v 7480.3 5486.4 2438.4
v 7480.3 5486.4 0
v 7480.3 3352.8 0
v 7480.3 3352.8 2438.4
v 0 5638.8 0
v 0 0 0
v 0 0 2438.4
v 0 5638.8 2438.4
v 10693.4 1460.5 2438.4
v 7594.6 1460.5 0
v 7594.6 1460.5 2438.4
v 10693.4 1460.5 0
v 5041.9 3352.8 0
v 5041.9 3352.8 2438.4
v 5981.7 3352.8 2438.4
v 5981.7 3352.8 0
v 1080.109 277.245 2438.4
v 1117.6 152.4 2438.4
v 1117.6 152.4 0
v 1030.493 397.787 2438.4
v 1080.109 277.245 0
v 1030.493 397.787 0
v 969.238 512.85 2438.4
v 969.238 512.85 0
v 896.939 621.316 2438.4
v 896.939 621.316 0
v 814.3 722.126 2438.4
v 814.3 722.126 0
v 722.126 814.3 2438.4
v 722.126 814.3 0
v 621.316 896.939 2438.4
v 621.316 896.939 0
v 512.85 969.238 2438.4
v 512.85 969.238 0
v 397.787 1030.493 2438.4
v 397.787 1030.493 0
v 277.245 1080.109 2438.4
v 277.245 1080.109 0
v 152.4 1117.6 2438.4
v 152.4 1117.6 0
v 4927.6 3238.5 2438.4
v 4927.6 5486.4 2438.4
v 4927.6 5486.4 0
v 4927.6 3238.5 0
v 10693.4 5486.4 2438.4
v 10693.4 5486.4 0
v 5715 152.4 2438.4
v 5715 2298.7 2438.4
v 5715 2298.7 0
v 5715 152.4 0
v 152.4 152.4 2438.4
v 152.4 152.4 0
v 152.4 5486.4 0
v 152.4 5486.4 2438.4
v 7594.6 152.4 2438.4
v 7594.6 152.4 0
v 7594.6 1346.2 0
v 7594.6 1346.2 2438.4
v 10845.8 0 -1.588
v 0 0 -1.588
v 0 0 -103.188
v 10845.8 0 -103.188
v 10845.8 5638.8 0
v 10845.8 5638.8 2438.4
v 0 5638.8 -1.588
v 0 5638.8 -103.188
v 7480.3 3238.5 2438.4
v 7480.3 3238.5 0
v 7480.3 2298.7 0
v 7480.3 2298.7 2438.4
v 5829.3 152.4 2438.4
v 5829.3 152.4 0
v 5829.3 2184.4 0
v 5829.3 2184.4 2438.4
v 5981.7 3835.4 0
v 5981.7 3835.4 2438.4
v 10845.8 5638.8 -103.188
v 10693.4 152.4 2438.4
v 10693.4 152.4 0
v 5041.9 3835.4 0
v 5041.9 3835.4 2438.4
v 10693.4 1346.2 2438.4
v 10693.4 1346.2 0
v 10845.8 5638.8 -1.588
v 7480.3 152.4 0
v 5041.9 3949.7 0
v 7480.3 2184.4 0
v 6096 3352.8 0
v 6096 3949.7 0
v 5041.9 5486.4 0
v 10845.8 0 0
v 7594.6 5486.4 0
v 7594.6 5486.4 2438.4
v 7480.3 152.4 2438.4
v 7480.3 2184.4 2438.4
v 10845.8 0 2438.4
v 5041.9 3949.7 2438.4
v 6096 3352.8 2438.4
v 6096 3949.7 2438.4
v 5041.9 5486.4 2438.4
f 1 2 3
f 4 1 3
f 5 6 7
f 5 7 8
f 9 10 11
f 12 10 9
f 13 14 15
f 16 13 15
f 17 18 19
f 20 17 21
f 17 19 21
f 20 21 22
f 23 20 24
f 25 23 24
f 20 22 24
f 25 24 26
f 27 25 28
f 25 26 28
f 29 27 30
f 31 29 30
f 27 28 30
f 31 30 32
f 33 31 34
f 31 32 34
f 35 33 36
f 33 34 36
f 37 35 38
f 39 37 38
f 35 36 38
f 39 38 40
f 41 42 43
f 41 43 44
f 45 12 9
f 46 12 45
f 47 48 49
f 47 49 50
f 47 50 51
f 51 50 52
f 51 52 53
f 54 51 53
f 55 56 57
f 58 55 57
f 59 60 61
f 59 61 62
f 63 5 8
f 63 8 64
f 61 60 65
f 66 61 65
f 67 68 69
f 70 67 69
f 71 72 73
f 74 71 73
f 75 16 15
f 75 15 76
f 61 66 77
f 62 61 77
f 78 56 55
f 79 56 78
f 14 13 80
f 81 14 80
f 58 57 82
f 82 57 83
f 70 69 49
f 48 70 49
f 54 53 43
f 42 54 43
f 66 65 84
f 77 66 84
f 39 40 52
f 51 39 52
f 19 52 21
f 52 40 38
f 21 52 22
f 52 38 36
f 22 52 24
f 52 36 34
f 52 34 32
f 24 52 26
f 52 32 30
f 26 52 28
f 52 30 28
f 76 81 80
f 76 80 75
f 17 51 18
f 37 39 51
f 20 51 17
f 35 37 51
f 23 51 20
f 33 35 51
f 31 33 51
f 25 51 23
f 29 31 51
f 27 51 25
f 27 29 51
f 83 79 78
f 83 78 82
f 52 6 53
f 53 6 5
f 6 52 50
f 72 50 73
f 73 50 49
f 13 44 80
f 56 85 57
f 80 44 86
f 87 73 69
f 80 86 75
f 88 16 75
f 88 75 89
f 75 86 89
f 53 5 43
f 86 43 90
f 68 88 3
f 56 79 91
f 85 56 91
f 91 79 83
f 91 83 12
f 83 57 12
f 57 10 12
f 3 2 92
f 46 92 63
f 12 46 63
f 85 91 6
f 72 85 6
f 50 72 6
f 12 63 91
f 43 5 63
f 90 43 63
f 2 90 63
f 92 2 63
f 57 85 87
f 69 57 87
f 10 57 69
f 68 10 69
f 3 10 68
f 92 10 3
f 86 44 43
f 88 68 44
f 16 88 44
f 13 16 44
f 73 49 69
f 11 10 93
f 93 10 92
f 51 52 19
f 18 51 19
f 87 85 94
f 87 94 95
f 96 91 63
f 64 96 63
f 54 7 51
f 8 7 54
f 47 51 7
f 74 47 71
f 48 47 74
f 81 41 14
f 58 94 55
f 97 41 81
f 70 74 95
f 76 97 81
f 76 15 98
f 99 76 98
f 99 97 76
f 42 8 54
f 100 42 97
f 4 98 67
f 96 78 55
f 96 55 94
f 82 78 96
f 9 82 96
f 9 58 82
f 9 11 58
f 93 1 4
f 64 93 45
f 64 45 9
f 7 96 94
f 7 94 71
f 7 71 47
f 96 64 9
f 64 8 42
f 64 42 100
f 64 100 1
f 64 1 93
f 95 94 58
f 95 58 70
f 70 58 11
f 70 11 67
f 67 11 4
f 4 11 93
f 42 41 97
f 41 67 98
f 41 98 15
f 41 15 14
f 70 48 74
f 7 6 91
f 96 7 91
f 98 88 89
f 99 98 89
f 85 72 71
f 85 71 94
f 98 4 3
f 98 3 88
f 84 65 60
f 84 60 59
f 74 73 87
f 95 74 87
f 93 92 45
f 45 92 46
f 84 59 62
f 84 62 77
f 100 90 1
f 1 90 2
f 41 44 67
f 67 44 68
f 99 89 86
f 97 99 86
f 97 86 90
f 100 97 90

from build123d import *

# Parameters (mm, degrees)
F1_W     = 10845.8
F1_H     = 5638.8
F1_W_2   = 1651
F1_H_2   = 2032
F1_W_3   = 3098.8
F1_H_3   = 1193.8
F1_W_4   = 939.8
F1_H_4   = 482.6
F1_H_5   = 4025.9
F3_DEPTH = 2438.4
F4_W     = 10845.8
F4_H     = 5638.8
F5_DEPTH = 101.6


# Not quite as in the source:
# - a length typed as a fraction of an inch, garbled in the dataset ("3 / 203.2 mm" for 3/8 in), is restored


with BuildPart() as f3:
    # F1 (on Top) → F3 (new body)
    with BuildSketch(Plane.XY):
        with Locations((5422.9, 2819.4)):
            Rectangle(F1_W, F1_H)
        Polygon((4927.6, 5486.4), (4927.6, 3238.5), (5041.9, 3238.5), (7480.3, 3238.5), (7480.3, 2298.7), (5829.3, 2298.7), (5715, 2298.7), (5715, 152.4), (152.4, 152.4), (152.4, 5486.4), align=None, mode=Mode.SUBTRACT)
        with Locations((6654.8, 1168.4)):
            Rectangle(F1_W_2, F1_H_2, mode=Mode.SUBTRACT)
        with Locations((9144, 749.3)):
            Rectangle(F1_W_3, F1_H_3, mode=Mode.SUBTRACT)
        with Locations((5511.8, 3594.1)):
            Rectangle(F1_W_4, F1_H_4, mode=Mode.SUBTRACT)
        with Locations((9144, 3473.45)):
            Rectangle(F1_W_3, F1_H_5, mode=Mode.SUBTRACT)
        Polygon((6096, 3949.7), (5041.9, 3949.7), (5041.9, 5486.4), (7480.3, 5486.4), (7480.3, 3352.8), (6096, 3352.8), (6096, 3835.4), align=None, mode=Mode.SUBTRACT)
    extrude(amount=F3_DEPTH)


with BuildPart() as f3b:
    # F2 (on Top) → F3, piece 2 (new body)
    with BuildSketch(Plane.XY):
        with BuildLine():
            Line((152.4, 152.4), (1117.6, 152.4))
            ThreePointArc((1117.6, 152.4), (769.3507636654, 769.3507636654), (152.4, 1117.6))
            Line((152.4, 1117.6), (152.4, 152.4))
        make_face()
    extrude(amount=F3_DEPTH)


with BuildPart() as f5:
    # F4 (on offset) → F5 (new body)
    with BuildSketch(Plane.XY.offset(-1.5875)):
        with Locations((5422.9, 2819.4)):
            Rectangle(F4_W, F4_H)
    extrude(amount=-F5_DEPTH)


solid = Compound([f3.part, f3b.part, f5.part])
